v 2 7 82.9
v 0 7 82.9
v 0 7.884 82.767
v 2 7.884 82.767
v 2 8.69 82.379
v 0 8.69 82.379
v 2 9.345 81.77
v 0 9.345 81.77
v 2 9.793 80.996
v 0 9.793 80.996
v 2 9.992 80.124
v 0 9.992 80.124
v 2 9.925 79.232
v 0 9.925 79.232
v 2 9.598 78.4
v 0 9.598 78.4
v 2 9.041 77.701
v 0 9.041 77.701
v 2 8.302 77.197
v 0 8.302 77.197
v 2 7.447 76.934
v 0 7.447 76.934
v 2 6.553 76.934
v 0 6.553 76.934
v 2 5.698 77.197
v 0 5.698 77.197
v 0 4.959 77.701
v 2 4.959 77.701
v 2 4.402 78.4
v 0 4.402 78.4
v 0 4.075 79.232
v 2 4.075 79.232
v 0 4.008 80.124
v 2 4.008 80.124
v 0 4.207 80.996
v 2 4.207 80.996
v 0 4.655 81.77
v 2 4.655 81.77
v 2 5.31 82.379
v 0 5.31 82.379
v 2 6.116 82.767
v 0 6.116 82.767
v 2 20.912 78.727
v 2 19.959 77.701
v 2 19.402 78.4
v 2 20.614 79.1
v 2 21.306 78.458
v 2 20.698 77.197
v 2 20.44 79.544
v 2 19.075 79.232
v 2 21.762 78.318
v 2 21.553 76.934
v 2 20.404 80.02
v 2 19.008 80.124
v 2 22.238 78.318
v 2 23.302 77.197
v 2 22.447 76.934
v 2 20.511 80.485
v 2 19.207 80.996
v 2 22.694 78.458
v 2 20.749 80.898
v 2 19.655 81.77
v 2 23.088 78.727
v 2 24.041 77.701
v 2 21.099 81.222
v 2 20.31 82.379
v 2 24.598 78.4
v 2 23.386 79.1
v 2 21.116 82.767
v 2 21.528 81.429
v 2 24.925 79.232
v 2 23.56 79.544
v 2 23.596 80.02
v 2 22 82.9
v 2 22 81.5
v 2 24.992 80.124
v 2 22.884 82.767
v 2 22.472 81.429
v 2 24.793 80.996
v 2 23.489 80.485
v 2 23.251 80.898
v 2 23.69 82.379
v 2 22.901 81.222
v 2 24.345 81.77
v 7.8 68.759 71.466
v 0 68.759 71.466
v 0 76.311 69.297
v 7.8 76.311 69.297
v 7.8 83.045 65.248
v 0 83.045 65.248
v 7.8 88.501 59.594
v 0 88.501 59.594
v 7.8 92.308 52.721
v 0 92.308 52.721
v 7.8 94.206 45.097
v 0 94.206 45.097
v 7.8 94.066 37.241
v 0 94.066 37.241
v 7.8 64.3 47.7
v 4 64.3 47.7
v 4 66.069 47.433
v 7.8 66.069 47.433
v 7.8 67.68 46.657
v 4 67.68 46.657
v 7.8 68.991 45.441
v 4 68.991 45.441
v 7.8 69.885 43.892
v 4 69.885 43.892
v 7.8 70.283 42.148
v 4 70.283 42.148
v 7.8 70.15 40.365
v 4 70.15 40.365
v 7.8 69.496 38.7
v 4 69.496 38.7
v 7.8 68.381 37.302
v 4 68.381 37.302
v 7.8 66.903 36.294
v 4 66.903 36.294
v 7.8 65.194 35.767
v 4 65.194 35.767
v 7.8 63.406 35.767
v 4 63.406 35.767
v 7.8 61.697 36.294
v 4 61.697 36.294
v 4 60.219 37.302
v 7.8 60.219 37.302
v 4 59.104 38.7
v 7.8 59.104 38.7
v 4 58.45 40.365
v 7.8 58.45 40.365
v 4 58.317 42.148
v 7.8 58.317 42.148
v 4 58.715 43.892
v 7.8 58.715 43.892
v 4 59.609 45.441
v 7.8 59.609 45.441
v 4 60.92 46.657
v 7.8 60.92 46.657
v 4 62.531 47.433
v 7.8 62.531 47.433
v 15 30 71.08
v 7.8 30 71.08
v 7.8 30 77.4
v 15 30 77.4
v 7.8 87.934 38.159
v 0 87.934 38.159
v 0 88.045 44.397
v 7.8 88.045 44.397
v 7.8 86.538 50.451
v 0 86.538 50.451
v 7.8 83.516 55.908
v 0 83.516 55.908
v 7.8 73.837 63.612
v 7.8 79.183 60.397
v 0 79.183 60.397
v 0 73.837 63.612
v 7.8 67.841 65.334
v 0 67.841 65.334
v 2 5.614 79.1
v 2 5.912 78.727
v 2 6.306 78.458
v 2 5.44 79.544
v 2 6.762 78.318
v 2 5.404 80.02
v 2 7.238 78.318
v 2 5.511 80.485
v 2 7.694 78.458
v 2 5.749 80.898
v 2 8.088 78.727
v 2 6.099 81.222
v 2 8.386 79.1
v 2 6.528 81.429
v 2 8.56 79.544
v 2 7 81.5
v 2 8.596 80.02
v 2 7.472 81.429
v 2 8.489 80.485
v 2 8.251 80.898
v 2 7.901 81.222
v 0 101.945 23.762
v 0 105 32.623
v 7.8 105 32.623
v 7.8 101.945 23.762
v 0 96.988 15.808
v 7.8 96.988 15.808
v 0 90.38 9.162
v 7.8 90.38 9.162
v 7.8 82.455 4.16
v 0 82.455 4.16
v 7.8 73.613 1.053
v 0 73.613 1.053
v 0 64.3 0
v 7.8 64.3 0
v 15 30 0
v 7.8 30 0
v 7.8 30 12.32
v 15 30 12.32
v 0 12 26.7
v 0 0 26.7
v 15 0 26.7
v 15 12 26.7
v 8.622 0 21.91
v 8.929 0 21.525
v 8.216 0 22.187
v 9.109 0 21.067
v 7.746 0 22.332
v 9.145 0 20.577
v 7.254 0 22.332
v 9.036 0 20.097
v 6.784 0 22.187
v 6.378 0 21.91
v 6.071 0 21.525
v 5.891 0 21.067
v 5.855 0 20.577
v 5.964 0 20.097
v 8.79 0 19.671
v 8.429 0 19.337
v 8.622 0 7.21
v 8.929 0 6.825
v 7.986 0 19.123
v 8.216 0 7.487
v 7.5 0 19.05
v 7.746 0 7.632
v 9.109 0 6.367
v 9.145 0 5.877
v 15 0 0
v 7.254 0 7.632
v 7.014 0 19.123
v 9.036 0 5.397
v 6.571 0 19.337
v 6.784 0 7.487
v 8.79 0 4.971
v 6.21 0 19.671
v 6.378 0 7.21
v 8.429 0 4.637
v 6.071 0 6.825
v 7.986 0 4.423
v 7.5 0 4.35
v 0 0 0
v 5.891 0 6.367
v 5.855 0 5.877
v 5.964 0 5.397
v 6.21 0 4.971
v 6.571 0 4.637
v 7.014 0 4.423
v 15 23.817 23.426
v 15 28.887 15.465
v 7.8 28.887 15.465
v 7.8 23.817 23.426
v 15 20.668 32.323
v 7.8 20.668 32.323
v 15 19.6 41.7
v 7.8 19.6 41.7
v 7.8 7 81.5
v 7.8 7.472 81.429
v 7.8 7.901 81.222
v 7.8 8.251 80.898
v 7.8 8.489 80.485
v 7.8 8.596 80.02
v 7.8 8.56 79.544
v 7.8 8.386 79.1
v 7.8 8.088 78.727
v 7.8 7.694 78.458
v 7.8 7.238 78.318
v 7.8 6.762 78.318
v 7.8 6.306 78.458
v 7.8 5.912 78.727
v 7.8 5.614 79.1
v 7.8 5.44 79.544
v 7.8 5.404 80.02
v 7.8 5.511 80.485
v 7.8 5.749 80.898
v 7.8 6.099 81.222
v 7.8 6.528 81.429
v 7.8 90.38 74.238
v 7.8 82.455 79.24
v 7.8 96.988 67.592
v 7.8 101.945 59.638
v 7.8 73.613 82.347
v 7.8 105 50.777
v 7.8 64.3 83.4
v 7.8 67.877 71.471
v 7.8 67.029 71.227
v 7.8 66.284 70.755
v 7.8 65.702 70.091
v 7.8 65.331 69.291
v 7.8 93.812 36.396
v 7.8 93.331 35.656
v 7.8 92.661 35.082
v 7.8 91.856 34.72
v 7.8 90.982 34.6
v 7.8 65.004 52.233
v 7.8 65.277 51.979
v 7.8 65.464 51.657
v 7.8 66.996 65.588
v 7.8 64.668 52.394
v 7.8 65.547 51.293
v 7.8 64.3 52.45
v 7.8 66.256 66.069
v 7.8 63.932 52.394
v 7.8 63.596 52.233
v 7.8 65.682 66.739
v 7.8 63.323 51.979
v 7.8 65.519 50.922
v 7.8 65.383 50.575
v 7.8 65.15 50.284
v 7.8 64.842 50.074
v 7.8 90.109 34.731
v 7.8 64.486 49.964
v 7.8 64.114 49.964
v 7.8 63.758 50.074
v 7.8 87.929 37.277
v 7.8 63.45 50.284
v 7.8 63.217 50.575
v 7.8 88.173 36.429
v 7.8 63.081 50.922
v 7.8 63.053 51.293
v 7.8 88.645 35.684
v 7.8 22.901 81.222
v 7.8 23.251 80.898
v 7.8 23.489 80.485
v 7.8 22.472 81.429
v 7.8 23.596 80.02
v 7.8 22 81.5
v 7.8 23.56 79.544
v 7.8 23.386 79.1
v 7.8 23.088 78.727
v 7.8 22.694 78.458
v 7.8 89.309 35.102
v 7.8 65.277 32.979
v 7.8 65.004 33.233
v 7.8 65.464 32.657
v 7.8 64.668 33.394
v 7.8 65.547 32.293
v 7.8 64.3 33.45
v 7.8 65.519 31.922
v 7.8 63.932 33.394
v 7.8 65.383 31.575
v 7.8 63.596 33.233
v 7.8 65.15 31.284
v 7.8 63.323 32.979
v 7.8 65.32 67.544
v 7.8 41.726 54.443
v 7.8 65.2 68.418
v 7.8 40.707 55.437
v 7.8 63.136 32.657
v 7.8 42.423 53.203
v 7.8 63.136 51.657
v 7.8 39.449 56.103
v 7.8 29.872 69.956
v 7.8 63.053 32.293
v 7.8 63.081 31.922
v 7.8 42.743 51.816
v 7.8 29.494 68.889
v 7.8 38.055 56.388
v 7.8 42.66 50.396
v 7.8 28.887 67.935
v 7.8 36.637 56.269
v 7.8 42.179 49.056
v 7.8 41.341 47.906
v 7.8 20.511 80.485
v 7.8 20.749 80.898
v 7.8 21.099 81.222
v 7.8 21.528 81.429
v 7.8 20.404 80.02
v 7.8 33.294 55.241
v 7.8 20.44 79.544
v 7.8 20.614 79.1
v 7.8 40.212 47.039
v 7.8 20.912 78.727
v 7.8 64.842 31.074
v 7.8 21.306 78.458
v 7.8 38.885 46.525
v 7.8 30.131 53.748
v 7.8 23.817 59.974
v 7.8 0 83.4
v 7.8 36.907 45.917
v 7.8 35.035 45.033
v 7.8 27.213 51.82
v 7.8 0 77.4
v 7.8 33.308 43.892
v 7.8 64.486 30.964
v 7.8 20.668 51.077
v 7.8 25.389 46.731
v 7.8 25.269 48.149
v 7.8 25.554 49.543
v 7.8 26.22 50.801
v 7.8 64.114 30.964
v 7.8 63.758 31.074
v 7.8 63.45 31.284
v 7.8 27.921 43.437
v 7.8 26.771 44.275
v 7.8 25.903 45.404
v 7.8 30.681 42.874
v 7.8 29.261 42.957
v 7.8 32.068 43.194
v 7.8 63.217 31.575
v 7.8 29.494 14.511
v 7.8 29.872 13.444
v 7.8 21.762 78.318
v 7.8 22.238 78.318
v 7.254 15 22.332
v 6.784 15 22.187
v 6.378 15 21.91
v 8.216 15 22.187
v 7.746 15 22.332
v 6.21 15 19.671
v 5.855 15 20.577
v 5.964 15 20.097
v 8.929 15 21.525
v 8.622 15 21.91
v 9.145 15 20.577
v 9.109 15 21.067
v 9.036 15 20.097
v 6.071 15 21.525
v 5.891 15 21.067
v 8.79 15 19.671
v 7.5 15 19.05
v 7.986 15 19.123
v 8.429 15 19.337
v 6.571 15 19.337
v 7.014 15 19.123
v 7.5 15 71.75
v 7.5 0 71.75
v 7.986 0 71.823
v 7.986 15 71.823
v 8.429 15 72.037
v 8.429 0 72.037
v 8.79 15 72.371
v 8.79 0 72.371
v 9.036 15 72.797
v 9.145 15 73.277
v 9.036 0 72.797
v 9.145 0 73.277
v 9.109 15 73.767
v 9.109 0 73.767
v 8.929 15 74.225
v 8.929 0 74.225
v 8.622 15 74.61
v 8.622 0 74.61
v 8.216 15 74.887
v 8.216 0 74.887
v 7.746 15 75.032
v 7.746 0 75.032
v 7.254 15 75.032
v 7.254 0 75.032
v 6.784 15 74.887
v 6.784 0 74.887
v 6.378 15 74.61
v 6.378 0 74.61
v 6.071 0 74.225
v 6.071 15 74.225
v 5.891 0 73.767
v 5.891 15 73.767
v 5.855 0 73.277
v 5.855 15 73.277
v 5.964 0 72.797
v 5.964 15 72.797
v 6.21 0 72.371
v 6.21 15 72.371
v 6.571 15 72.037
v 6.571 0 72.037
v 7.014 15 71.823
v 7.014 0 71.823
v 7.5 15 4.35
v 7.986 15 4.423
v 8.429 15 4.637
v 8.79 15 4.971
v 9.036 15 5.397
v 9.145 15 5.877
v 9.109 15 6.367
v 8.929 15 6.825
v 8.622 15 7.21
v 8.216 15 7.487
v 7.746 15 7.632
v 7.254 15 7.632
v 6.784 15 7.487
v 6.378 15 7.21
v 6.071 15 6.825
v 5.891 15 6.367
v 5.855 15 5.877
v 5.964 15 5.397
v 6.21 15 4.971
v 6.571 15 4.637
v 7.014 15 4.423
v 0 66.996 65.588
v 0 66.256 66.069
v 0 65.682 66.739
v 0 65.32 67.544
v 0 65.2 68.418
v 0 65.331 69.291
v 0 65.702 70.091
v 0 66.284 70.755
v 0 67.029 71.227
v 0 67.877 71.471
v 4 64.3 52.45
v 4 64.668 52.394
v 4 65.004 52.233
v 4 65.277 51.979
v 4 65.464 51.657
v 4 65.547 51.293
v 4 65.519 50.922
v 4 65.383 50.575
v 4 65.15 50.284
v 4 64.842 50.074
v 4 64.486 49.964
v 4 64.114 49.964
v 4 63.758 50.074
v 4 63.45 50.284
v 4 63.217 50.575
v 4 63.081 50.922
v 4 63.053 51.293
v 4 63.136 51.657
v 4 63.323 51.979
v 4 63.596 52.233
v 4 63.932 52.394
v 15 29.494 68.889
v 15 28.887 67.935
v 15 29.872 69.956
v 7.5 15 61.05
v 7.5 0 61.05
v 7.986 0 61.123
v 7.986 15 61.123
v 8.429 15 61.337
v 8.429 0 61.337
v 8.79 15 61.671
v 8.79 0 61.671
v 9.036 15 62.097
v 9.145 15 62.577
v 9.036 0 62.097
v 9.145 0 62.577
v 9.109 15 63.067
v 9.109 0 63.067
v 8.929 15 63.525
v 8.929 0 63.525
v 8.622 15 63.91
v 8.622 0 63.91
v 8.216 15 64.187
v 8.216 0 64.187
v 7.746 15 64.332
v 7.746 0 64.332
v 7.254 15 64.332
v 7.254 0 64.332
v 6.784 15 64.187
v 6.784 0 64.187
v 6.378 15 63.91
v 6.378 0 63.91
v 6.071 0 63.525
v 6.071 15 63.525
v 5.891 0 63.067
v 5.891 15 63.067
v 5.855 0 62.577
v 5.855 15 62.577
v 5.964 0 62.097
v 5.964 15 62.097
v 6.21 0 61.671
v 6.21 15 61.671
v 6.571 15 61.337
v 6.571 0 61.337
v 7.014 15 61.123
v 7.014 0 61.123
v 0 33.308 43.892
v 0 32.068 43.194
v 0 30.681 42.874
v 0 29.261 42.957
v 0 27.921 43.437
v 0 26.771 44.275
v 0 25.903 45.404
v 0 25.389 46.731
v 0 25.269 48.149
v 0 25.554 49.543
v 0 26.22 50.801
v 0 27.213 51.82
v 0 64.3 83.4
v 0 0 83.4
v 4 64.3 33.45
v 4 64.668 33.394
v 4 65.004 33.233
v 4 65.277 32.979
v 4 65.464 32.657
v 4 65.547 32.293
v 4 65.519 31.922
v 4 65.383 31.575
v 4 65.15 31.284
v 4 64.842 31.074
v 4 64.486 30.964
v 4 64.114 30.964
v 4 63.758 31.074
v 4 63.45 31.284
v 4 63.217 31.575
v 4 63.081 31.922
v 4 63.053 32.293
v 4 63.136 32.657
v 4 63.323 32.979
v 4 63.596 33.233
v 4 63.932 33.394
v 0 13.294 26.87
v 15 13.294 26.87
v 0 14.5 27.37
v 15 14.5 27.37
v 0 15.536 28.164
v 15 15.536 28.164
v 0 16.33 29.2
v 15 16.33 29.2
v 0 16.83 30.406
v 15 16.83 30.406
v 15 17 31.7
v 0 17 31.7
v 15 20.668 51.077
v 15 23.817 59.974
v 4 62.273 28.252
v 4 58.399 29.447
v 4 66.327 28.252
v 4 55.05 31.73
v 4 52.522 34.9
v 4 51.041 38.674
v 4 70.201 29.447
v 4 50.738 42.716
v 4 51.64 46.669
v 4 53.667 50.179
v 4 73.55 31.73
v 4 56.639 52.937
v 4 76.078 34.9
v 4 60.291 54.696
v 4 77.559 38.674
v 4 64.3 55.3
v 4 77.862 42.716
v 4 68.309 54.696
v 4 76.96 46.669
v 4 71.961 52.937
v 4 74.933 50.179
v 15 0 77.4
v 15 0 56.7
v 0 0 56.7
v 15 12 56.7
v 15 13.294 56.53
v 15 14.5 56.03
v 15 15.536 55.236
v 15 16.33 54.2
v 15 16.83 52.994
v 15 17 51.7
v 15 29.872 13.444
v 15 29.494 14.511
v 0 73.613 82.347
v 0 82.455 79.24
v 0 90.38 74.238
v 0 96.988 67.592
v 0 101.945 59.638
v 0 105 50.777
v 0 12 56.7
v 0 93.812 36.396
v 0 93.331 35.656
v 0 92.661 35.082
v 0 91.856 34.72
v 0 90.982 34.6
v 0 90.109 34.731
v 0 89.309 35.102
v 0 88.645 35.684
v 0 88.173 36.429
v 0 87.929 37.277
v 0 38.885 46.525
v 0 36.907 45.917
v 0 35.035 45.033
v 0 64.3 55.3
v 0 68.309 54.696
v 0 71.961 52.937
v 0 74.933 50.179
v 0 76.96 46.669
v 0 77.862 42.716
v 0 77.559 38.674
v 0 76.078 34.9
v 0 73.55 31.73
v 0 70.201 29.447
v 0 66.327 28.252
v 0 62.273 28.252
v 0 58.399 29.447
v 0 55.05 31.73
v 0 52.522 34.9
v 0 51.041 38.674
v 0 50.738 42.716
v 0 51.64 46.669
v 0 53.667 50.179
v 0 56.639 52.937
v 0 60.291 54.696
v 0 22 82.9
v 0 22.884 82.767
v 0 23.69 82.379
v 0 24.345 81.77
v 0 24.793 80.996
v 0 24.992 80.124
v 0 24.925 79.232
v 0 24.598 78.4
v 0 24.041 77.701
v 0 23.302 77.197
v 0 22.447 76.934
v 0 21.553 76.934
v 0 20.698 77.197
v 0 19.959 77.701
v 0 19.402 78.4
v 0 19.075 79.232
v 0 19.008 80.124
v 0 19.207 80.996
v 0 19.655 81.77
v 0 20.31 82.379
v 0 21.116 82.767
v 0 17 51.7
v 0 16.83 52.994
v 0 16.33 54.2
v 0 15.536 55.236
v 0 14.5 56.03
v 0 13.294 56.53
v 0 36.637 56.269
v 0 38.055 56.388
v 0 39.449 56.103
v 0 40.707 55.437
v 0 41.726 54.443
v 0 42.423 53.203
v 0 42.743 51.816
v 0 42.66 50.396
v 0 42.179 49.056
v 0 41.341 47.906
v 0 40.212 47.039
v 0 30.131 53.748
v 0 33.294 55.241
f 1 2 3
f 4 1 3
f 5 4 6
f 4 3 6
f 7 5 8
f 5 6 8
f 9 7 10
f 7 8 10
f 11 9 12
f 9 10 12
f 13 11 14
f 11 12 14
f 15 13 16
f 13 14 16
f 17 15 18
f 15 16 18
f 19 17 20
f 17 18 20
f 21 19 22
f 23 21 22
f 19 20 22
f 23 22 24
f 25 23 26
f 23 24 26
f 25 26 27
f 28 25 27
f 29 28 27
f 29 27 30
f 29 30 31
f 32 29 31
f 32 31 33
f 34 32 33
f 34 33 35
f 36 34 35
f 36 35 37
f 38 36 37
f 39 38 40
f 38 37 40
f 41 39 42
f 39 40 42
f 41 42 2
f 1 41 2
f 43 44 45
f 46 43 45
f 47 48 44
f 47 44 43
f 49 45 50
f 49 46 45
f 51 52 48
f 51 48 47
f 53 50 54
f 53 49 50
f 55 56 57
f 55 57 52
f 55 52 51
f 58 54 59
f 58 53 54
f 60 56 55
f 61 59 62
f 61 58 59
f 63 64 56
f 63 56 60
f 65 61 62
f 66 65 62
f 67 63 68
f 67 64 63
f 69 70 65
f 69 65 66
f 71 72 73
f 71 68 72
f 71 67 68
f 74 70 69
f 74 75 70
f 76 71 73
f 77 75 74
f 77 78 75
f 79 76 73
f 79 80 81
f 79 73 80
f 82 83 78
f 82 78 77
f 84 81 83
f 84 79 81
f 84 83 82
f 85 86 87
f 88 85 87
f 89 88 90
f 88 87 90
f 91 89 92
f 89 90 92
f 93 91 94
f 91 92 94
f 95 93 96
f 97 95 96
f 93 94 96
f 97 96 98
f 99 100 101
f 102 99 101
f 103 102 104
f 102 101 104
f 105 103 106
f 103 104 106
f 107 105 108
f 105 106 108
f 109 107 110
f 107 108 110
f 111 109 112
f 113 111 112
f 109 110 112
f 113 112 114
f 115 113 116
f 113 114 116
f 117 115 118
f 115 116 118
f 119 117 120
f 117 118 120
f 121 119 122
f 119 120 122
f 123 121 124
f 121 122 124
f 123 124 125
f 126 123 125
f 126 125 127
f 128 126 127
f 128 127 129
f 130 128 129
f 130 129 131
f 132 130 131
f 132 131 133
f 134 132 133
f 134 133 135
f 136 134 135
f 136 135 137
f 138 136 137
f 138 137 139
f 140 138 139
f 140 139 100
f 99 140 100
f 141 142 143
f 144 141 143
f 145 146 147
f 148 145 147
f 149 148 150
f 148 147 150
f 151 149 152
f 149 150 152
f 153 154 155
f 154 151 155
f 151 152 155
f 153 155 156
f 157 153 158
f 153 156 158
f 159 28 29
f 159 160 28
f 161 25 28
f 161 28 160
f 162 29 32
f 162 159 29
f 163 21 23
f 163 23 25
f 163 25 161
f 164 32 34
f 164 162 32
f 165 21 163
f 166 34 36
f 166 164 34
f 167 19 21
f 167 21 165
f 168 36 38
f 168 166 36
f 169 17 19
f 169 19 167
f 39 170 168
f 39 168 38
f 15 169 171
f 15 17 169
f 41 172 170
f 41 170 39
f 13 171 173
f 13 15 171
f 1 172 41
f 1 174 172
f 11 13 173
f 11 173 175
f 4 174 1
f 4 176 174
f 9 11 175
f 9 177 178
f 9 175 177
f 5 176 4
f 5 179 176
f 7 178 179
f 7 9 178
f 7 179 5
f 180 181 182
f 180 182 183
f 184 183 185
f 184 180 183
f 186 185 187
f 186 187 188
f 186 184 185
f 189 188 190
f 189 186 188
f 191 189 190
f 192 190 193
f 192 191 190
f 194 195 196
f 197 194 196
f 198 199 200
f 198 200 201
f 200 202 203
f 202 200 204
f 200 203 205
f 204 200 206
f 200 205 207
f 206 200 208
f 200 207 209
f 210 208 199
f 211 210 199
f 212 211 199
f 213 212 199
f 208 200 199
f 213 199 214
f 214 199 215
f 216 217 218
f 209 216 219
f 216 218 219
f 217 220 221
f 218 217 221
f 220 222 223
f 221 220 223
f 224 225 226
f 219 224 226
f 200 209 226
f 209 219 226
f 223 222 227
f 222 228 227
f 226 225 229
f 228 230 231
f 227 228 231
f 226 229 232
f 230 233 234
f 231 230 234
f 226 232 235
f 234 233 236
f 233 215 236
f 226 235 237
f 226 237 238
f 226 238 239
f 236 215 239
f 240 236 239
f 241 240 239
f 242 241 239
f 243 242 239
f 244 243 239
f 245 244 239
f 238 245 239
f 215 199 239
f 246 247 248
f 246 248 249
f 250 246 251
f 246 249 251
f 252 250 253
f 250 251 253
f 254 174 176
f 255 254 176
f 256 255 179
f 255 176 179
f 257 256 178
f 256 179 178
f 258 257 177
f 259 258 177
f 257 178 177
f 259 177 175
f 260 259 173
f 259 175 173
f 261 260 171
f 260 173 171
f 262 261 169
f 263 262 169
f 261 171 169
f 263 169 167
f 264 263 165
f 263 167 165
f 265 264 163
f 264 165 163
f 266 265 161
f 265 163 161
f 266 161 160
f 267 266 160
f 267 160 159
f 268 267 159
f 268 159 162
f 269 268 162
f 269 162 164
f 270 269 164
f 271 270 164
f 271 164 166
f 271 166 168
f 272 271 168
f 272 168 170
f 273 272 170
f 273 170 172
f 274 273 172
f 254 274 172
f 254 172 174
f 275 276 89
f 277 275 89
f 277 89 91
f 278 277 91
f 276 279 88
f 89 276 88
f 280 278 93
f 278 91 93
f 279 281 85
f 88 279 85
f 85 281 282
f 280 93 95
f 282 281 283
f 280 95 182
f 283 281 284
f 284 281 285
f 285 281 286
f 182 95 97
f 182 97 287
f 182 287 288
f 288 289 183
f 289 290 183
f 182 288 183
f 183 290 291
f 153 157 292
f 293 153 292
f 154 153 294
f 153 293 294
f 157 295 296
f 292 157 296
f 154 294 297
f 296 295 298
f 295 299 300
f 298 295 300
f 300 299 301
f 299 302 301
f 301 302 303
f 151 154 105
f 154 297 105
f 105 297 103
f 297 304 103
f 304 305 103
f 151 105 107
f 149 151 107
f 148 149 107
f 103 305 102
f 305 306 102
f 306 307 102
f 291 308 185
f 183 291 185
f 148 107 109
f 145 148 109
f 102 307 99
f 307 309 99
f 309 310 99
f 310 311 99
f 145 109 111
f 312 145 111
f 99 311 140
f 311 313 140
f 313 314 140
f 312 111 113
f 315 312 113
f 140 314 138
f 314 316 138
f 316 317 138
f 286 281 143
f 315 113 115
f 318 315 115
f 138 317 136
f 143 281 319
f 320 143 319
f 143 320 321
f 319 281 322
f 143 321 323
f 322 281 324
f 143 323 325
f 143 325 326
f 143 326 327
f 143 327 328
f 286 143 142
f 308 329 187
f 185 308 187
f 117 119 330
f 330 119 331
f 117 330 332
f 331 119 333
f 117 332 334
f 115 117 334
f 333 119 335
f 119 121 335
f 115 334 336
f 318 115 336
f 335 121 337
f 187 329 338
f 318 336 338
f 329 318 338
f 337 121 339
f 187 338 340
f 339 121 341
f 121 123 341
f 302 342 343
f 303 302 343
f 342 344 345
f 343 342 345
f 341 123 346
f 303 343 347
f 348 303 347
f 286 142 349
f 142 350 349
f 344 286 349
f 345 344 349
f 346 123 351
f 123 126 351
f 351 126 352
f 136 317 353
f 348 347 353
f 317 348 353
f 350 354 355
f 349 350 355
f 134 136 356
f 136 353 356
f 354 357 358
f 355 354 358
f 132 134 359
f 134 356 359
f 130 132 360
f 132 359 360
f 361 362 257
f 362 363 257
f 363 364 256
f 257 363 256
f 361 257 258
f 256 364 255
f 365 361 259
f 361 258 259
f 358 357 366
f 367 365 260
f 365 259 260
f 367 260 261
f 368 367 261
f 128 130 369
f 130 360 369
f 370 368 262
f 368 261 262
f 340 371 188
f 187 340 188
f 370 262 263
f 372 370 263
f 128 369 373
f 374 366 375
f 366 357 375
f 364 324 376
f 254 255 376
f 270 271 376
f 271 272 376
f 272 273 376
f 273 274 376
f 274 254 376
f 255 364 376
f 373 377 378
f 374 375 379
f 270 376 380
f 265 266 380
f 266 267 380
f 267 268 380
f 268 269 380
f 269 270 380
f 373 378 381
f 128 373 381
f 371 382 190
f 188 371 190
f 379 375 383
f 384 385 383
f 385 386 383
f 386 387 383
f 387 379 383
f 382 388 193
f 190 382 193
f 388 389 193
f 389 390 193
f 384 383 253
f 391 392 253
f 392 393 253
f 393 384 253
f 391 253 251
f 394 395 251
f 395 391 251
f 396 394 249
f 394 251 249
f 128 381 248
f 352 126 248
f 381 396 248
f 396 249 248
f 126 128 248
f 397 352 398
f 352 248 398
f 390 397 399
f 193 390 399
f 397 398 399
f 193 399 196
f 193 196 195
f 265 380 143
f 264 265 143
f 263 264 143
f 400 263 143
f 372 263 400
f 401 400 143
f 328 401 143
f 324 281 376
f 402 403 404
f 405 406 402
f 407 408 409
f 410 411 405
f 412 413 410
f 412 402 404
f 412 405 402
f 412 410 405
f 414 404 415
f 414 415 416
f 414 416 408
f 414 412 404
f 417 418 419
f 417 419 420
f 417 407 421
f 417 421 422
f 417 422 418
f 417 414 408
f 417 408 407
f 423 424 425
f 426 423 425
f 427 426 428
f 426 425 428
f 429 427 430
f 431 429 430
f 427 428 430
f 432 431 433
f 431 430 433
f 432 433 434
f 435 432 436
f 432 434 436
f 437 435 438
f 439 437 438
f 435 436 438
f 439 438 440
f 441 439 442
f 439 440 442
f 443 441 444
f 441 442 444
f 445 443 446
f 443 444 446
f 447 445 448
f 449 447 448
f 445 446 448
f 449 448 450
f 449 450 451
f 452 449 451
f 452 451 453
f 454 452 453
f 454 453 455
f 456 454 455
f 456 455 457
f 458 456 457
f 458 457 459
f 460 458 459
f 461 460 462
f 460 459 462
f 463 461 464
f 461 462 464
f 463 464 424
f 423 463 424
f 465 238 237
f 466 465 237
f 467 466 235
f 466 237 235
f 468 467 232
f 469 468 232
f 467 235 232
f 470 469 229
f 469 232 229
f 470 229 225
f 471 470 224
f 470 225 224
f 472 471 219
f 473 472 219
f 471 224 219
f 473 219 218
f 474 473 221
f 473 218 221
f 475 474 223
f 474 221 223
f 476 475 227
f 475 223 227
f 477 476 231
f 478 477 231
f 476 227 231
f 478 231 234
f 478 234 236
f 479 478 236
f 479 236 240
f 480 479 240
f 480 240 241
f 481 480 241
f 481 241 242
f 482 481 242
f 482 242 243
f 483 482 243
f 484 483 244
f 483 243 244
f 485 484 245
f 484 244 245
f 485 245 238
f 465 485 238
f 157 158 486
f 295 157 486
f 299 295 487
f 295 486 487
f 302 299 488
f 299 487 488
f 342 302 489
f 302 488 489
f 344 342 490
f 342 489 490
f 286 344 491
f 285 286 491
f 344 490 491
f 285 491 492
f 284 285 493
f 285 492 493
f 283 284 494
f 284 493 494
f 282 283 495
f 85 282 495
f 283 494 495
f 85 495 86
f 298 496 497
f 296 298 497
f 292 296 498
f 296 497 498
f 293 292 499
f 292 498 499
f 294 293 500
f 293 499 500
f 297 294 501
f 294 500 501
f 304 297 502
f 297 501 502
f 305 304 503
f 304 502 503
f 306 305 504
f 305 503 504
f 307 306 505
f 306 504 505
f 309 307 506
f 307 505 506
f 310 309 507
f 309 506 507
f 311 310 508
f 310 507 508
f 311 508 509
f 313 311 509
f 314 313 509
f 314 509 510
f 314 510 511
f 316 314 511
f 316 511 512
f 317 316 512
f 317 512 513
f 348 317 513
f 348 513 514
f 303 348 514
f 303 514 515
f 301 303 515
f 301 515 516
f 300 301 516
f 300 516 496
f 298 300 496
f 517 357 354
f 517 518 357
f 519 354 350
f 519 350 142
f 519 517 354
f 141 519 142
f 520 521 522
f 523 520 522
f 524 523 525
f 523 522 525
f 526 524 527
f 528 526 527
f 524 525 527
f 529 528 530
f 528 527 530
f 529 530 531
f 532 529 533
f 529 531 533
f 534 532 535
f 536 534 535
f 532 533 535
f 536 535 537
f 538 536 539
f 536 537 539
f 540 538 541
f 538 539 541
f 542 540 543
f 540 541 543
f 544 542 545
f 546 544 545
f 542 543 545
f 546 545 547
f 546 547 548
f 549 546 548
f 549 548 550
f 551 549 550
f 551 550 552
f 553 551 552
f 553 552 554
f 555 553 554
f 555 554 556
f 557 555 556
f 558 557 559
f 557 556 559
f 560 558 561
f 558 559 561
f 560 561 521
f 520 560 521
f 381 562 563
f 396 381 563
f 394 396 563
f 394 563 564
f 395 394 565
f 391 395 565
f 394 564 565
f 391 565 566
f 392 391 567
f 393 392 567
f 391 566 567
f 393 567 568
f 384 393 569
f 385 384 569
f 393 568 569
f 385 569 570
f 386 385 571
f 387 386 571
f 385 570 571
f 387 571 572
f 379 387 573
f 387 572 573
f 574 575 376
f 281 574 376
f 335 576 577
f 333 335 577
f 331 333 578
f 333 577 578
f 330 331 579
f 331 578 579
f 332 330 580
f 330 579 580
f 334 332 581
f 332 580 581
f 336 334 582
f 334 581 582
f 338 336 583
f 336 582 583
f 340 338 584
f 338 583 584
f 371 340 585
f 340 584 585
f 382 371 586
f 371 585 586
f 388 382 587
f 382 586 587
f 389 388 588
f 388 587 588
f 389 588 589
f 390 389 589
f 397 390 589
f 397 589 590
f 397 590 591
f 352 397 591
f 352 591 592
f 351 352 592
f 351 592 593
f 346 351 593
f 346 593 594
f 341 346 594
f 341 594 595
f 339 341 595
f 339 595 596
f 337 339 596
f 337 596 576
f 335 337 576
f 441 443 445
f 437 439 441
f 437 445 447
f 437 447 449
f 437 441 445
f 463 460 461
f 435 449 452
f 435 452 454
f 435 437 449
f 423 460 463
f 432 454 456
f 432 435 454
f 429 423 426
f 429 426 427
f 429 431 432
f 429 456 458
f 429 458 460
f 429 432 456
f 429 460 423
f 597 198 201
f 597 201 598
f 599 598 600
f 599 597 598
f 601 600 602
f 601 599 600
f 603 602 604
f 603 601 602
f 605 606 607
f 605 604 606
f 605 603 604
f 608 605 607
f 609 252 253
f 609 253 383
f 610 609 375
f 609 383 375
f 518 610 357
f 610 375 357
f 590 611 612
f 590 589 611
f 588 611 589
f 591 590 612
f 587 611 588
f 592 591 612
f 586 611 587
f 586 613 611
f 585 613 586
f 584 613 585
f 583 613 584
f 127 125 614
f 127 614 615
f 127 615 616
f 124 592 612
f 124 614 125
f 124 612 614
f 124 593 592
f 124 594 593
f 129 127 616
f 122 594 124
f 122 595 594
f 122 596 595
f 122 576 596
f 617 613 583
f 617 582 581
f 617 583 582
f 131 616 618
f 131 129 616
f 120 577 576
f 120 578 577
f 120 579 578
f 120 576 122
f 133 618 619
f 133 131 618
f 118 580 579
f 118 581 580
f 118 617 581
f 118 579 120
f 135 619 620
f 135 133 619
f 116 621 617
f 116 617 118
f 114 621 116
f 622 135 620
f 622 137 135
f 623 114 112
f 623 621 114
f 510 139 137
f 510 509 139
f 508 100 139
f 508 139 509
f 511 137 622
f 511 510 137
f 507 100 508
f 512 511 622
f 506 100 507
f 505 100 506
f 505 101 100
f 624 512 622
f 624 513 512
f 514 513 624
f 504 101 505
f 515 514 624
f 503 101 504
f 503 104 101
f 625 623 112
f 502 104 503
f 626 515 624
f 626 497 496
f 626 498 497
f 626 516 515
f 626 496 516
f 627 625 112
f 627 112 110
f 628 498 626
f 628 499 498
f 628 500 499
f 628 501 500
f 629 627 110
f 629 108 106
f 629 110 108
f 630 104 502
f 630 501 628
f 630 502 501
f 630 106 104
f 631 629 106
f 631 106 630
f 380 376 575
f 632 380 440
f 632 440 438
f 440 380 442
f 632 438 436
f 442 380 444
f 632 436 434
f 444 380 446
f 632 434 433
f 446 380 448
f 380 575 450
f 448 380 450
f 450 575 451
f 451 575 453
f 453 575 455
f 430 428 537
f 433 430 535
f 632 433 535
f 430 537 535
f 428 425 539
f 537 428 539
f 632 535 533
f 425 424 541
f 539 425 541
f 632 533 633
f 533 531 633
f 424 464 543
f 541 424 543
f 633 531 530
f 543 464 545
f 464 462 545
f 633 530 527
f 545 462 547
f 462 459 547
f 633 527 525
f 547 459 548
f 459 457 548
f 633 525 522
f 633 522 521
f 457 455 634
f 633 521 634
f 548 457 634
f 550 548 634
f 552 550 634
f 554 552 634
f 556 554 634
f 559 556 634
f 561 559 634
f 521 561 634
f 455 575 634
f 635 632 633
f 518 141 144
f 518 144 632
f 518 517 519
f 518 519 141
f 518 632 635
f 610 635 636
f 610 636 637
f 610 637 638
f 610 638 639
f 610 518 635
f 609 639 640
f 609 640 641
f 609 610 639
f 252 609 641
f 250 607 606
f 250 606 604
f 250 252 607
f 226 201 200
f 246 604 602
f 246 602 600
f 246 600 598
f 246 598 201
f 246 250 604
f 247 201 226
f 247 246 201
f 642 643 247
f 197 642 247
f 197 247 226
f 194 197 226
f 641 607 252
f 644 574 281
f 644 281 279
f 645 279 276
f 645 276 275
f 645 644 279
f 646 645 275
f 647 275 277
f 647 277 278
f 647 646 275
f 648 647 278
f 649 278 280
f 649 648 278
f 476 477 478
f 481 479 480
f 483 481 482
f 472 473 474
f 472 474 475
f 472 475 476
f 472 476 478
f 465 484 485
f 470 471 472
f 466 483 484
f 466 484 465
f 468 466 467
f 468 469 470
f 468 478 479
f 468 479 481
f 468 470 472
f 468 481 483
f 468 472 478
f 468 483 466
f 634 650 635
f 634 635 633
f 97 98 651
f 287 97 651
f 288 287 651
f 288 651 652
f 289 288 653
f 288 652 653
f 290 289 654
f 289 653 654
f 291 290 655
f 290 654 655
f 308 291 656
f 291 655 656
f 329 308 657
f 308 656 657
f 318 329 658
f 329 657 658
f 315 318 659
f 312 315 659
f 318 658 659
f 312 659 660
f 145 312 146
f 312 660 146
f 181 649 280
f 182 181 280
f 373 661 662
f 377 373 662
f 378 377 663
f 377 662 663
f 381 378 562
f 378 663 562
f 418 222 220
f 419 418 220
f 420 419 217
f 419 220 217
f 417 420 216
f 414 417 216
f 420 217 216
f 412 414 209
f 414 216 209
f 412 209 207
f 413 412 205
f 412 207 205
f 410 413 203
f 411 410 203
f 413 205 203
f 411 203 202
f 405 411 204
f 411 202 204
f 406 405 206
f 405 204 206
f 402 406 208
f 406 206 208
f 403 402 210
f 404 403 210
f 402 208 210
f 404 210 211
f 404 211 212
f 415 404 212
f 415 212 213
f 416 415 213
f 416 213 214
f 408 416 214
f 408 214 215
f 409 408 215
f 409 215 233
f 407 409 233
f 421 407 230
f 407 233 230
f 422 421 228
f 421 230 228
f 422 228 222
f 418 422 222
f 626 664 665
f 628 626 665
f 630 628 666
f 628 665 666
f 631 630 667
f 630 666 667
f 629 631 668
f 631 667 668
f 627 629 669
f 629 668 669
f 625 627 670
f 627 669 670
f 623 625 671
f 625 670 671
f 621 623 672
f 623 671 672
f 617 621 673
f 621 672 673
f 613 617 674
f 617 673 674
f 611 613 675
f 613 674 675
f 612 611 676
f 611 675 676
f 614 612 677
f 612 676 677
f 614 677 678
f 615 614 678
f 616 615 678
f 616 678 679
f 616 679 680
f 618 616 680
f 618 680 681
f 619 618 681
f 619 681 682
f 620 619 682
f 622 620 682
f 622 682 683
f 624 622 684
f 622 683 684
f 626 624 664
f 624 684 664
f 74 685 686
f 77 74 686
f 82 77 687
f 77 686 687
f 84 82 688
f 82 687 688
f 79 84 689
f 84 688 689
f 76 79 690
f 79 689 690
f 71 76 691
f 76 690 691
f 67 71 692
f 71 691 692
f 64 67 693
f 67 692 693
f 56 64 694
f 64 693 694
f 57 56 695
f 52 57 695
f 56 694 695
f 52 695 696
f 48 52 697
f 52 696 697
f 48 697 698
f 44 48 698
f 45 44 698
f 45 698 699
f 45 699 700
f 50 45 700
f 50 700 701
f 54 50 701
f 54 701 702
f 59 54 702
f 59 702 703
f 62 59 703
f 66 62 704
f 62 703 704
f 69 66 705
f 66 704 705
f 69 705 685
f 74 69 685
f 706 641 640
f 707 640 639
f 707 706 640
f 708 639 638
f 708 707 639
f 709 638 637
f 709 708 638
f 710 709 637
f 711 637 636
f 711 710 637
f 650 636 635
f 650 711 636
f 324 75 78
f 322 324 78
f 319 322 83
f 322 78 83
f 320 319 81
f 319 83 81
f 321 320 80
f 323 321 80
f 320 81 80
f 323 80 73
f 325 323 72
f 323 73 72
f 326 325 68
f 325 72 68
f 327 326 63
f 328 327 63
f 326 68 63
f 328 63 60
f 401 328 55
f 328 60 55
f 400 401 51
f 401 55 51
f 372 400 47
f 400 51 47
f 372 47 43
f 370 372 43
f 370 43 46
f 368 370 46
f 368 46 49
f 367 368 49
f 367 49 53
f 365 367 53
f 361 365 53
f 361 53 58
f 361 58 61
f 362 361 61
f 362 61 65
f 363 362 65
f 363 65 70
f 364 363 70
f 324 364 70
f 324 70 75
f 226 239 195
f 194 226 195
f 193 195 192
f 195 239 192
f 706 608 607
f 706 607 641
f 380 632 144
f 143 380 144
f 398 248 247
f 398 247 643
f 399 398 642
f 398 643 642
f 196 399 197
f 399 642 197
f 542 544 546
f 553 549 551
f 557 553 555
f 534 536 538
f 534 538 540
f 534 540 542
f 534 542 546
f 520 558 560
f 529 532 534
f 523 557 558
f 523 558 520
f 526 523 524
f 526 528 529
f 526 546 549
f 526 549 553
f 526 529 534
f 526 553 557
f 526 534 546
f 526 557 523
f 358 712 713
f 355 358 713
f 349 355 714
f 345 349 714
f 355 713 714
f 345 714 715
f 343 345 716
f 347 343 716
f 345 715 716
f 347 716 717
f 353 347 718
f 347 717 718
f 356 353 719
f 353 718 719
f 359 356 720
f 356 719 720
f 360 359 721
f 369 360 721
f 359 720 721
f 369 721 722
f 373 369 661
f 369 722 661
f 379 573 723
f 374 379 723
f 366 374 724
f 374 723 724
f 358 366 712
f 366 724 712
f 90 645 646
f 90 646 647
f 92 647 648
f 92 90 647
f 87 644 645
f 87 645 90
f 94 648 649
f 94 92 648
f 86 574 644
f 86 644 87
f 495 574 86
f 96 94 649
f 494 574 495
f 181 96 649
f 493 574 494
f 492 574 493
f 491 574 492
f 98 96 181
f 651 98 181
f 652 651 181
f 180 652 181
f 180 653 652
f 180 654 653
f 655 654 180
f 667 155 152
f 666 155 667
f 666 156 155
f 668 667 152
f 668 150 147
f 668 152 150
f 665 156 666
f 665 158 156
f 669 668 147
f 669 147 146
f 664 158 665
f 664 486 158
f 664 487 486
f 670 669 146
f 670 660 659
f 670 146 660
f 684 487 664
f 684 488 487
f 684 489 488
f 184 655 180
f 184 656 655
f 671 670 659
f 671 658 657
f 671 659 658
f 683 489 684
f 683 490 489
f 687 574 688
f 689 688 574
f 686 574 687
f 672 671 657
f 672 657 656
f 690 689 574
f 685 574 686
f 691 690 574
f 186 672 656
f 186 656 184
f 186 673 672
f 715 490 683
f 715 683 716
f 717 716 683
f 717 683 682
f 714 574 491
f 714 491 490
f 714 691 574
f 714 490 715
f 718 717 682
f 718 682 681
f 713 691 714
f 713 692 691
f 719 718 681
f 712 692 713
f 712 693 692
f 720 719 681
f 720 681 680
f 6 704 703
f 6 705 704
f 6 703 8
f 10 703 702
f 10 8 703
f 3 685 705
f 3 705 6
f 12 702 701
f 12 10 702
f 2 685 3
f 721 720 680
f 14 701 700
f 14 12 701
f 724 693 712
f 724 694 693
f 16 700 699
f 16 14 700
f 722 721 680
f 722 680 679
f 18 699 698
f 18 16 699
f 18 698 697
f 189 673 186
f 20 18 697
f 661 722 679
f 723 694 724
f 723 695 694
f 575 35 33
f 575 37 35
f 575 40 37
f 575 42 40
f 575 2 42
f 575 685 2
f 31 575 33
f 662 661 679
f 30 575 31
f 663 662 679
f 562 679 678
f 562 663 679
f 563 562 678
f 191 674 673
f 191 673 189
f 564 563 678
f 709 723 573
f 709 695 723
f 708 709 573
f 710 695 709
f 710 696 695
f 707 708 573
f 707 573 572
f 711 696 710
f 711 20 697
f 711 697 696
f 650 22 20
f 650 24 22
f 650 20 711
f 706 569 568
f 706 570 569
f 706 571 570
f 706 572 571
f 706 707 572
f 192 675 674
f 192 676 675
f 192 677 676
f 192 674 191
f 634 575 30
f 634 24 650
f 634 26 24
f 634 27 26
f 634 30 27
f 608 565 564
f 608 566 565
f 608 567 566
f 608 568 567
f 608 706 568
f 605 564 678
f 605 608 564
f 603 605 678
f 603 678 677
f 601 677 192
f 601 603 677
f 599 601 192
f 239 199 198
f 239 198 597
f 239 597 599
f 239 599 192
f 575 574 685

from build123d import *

# Parameters (mm, degrees)
SKETCH_1_W           = 7.8
SKETCH_1_H           = 83.4
EXTRUDE_1_DEPTH      = 105
CUT_EXTRUDE_1_DEPTH  = 135.318278726
SKETCH_3_R           = 6
CUT_EXTRUDE_2_DEPTH  = 135.318278726
SKETCH_4_R           = 13.6
CUT_EXTRUDE_3_DEPTH  = 4
SKETCH_5_R           = 1.25
CUT_EXTRUDE_4_DEPTH  = 4
EXTRUDE_2_DEPTH      = 7.2
SKETCH_7_W           = 6
SKETCH_7_H           = 30
CUT_EXTRUDE_5_DEPTH  = 7.2
CUT_EXTRUDE_6_DEPTH  = 135.92798079
SKETCH_9_R           = 1.65
CUT_EXTRUDE_7_DEPTH  = 15
CUT_EXTRUDE_8_DEPTH  = 135.92798079
FILLET_1_R           = 5
CUT_EXTRUDE_10_DEPTH = 135.92798079
SKETCH_16_R          = 1.6
CUT_EXTRUDE_11_DEPTH = 135.92798079
SKETCH_17_R          = 3
CUT_EXTRUDE_12_DEPTH = 2


with BuildPart() as part:
    # 草图1 → 凸台-拉伸1 (new body)
    with BuildSketch(Plane(origin=(0, 0, 0), x_dir=(1, 0, 0), z_dir=(0, 1, 0))):
        with Locations((3.9, -41.7)):
            Rectangle(SKETCH_1_W, SKETCH_1_H)
    extrude(amount=EXTRUDE_1_DEPTH)

    # 草图2 → 切除-拉伸1 (cut, through all)
    with BuildSketch(Plane.ZY):
        with BuildLine():
            Line((0, 64.3), (0, 105))
            Line((0, 105), (32.622555426, 105))
            ThreePointArc((32.622555426, 105), (9.162180169, 90.380266115), (0, 64.3))
        make_face()
        with BuildLine():
            Line((83.4, 105), (83.4, 64.3))
            ThreePointArc((83.4, 64.3), (74.237819831, 90.380266115), (50.777444574, 105))
            Line((50.777444574, 105), (83.4, 105))
        make_face()
    extrude(amount=-CUT_EXTRUDE_1_DEPTH, mode=Mode.SUBTRACT)

    # 草图3 → 切除-拉伸2 (cut, through all)
    with BuildSketch(Plane.ZY):
        with Locations((41.7, 64.3)):
            Circle(SKETCH_3_R)
    extrude(amount=-CUT_EXTRUDE_2_DEPTH, mode=Mode.SUBTRACT)

    # 草图4 → 切除-拉伸3 (cut)
    with BuildSketch(Plane.ZY):
        with Locations((41.7, 64.3)):
            Circle(SKETCH_4_R)
    extrude(amount=-CUT_EXTRUDE_3_DEPTH, mode=Mode.SUBTRACT)

    # 草图5 → 切除-拉伸4 (cut)
    with BuildSketch(Plane.ZY.offset(-4)):
        with Locations((32.2, 64.3)):
            Circle(SKETCH_5_R)
        with Locations((51.2, 64.3)):
            Circle(SKETCH_5_R)
    extrude(amount=-CUT_EXTRUDE_4_DEPTH, mode=Mode.SUBTRACT)

    # 草图6 → 凸台-拉伸2 (add)
    with BuildSketch(Plane(origin=(7.8, 0, 0), x_dir=(0, 0, -1), z_dir=(1, 0, 0))):
        with BuildLine():
            ThreePointArc((-14.146415841, 30), (-26.974511893, 22.286540784), (-41.7, 19.6))
            Line((-41.7, 19.6), (-41.7, 0))
            Line((-41.7, 0), (0, 0))
            Line((0, 0), (0, 30))
            Line((0, 30), (-14.146415841, 30))
        make_face()
        with BuildLine():
            Line((-41.7, 0), (-41.7, 19.6))
            ThreePointArc((-41.7, 19.6), (-56.425488107, 22.286540784), (-69.253584159, 30))
            Line((-69.253584159, 30), (-83.4, 30))
            Line((-83.4, 30), (-83.4, 0))
            Line((-83.4, 0), (-41.7, 0))
        make_face()
    extrude(amount=EXTRUDE_2_DEPTH)

    # 草图7 → 切除-拉伸5 (cut)
    with BuildSketch(Plane(origin=(15, 0, 0), x_dir=(0, 0, -1), z_dir=(1, 0, 0))):
        with Locations((-80.4, 15)):
            Rectangle(SKETCH_7_W, SKETCH_7_H)
    extrude(amount=-CUT_EXTRUDE_5_DEPTH, mode=Mode.SUBTRACT)

    # 草图8 → 切除-拉伸6 (cut, through all)
    with BuildSketch(Plane.ZY):
        with BuildLine():
            Line((31.7, 17), (51.7, 17))
            ThreePointArc((51.7, 17), (55.235533906, 15.535533906), (56.7, 12))
            Line((56.7, 12), (56.7, 0))
            Line((56.7, 0), (26.7, 0))
            Line((26.7, 0), (26.7, 12))
            ThreePointArc((26.7, 12), (28.164466094, 15.535533906), (31.7, 17))
        make_face()
    extrude(amount=-CUT_EXTRUDE_6_DEPTH, mode=Mode.SUBTRACT)

    # 草图9 → 切除-拉伸7 (cut)
    with BuildSketch(Plane.XZ):
        with Locations(Location((7.5, 73.4, 0), (0, 0, 270))):
            Circle(SKETCH_9_R)
        with Locations(Location((7.5, 62.7, 0), (0, 0, 270))):
            Circle(SKETCH_9_R)
        with Locations(Location((7.5, 20.7, 0), (0, 0, 270))):
            Circle(SKETCH_9_R)
        with Locations(Location((7.5, 6, 0), (0, 0, 270))):
            Circle(SKETCH_9_R)
    extrude(amount=-CUT_EXTRUDE_7_DEPTH, mode=Mode.SUBTRACT)

    # 草图10 → 切除-拉伸8 (cut, through all)
    with BuildSketch(Plane.ZY):
        with BuildLine():
            ThreePointArc((71.465786865, 68.759293912), (59.594392775, 88.500786704), (37.240706088, 94.065786865))
            ThreePointArc((37.240706088, 94.065786865), (34.634213135, 90.540706088), (38.159293912, 87.934213135))
            ThreePointArc((38.159293912, 87.934213135), (55.908255091, 83.51556966), (65.334213135, 67.840706088))
            ThreePointArc((65.334213135, 67.840706088), (68.859293912, 65.234213135), (71.465786865, 68.759293912))
        make_face()
    extrude(amount=-CUT_EXTRUDE_8_DEPTH, mode=Mode.SUBTRACT)

    # 圆角1
    fillet_1_edges = [part.edges().sort_by_distance(p)[0] for p in [
        (11.4, 30, 14.146415841),
        (11.4, 30, 69.253584159),
    ]]
    fillet(fillet_1_edges, radius=FILLET_1_R)

    # 草图15 → 切除-拉伸10 (cut, through all)
    with BuildSketch(Plane.ZY):
        with BuildLine():
            ThreePointArc((51.819846568, 27.213416986), (54.551104159, 31.68578749), (56.268755758, 36.63670043))
            ThreePointArc((56.268755758, 36.63670043), (52.521049565, 42.632924099), (46.524825896, 38.885217906))
            ThreePointArc((46.524825896, 38.885217906), (45.508256582, 35.955085758), (43.891798008, 33.308172603))
            ThreePointArc((43.891798008, 33.308172603), (44.80844448, 26.296770514), (51.819846568, 27.213416986))
        make_face()
    extrude(amount=-CUT_EXTRUDE_10_DEPTH, mode=Mode.SUBTRACT)

    # 草图16 → 切除-拉伸11 (cut, through all)
    with BuildSketch(Plane.ZY):
        with Locations((79.9, 7)):
            Circle(SKETCH_16_R)
        with Locations((79.9, 22)):
            Circle(SKETCH_16_R)
    extrude(amount=-CUT_EXTRUDE_11_DEPTH, mode=Mode.SUBTRACT)

    # 草图17 → 切除-拉伸12 (cut)
    with BuildSketch(Plane.ZY):
        with Locations((79.9, 7)):
            Circle(SKETCH_17_R)
        with Locations((79.9, 22)):
            Circle(SKETCH_17_R)
    extrude(amount=-CUT_EXTRUDE_12_DEPTH, mode=Mode.SUBTRACT)


solid = part.part
